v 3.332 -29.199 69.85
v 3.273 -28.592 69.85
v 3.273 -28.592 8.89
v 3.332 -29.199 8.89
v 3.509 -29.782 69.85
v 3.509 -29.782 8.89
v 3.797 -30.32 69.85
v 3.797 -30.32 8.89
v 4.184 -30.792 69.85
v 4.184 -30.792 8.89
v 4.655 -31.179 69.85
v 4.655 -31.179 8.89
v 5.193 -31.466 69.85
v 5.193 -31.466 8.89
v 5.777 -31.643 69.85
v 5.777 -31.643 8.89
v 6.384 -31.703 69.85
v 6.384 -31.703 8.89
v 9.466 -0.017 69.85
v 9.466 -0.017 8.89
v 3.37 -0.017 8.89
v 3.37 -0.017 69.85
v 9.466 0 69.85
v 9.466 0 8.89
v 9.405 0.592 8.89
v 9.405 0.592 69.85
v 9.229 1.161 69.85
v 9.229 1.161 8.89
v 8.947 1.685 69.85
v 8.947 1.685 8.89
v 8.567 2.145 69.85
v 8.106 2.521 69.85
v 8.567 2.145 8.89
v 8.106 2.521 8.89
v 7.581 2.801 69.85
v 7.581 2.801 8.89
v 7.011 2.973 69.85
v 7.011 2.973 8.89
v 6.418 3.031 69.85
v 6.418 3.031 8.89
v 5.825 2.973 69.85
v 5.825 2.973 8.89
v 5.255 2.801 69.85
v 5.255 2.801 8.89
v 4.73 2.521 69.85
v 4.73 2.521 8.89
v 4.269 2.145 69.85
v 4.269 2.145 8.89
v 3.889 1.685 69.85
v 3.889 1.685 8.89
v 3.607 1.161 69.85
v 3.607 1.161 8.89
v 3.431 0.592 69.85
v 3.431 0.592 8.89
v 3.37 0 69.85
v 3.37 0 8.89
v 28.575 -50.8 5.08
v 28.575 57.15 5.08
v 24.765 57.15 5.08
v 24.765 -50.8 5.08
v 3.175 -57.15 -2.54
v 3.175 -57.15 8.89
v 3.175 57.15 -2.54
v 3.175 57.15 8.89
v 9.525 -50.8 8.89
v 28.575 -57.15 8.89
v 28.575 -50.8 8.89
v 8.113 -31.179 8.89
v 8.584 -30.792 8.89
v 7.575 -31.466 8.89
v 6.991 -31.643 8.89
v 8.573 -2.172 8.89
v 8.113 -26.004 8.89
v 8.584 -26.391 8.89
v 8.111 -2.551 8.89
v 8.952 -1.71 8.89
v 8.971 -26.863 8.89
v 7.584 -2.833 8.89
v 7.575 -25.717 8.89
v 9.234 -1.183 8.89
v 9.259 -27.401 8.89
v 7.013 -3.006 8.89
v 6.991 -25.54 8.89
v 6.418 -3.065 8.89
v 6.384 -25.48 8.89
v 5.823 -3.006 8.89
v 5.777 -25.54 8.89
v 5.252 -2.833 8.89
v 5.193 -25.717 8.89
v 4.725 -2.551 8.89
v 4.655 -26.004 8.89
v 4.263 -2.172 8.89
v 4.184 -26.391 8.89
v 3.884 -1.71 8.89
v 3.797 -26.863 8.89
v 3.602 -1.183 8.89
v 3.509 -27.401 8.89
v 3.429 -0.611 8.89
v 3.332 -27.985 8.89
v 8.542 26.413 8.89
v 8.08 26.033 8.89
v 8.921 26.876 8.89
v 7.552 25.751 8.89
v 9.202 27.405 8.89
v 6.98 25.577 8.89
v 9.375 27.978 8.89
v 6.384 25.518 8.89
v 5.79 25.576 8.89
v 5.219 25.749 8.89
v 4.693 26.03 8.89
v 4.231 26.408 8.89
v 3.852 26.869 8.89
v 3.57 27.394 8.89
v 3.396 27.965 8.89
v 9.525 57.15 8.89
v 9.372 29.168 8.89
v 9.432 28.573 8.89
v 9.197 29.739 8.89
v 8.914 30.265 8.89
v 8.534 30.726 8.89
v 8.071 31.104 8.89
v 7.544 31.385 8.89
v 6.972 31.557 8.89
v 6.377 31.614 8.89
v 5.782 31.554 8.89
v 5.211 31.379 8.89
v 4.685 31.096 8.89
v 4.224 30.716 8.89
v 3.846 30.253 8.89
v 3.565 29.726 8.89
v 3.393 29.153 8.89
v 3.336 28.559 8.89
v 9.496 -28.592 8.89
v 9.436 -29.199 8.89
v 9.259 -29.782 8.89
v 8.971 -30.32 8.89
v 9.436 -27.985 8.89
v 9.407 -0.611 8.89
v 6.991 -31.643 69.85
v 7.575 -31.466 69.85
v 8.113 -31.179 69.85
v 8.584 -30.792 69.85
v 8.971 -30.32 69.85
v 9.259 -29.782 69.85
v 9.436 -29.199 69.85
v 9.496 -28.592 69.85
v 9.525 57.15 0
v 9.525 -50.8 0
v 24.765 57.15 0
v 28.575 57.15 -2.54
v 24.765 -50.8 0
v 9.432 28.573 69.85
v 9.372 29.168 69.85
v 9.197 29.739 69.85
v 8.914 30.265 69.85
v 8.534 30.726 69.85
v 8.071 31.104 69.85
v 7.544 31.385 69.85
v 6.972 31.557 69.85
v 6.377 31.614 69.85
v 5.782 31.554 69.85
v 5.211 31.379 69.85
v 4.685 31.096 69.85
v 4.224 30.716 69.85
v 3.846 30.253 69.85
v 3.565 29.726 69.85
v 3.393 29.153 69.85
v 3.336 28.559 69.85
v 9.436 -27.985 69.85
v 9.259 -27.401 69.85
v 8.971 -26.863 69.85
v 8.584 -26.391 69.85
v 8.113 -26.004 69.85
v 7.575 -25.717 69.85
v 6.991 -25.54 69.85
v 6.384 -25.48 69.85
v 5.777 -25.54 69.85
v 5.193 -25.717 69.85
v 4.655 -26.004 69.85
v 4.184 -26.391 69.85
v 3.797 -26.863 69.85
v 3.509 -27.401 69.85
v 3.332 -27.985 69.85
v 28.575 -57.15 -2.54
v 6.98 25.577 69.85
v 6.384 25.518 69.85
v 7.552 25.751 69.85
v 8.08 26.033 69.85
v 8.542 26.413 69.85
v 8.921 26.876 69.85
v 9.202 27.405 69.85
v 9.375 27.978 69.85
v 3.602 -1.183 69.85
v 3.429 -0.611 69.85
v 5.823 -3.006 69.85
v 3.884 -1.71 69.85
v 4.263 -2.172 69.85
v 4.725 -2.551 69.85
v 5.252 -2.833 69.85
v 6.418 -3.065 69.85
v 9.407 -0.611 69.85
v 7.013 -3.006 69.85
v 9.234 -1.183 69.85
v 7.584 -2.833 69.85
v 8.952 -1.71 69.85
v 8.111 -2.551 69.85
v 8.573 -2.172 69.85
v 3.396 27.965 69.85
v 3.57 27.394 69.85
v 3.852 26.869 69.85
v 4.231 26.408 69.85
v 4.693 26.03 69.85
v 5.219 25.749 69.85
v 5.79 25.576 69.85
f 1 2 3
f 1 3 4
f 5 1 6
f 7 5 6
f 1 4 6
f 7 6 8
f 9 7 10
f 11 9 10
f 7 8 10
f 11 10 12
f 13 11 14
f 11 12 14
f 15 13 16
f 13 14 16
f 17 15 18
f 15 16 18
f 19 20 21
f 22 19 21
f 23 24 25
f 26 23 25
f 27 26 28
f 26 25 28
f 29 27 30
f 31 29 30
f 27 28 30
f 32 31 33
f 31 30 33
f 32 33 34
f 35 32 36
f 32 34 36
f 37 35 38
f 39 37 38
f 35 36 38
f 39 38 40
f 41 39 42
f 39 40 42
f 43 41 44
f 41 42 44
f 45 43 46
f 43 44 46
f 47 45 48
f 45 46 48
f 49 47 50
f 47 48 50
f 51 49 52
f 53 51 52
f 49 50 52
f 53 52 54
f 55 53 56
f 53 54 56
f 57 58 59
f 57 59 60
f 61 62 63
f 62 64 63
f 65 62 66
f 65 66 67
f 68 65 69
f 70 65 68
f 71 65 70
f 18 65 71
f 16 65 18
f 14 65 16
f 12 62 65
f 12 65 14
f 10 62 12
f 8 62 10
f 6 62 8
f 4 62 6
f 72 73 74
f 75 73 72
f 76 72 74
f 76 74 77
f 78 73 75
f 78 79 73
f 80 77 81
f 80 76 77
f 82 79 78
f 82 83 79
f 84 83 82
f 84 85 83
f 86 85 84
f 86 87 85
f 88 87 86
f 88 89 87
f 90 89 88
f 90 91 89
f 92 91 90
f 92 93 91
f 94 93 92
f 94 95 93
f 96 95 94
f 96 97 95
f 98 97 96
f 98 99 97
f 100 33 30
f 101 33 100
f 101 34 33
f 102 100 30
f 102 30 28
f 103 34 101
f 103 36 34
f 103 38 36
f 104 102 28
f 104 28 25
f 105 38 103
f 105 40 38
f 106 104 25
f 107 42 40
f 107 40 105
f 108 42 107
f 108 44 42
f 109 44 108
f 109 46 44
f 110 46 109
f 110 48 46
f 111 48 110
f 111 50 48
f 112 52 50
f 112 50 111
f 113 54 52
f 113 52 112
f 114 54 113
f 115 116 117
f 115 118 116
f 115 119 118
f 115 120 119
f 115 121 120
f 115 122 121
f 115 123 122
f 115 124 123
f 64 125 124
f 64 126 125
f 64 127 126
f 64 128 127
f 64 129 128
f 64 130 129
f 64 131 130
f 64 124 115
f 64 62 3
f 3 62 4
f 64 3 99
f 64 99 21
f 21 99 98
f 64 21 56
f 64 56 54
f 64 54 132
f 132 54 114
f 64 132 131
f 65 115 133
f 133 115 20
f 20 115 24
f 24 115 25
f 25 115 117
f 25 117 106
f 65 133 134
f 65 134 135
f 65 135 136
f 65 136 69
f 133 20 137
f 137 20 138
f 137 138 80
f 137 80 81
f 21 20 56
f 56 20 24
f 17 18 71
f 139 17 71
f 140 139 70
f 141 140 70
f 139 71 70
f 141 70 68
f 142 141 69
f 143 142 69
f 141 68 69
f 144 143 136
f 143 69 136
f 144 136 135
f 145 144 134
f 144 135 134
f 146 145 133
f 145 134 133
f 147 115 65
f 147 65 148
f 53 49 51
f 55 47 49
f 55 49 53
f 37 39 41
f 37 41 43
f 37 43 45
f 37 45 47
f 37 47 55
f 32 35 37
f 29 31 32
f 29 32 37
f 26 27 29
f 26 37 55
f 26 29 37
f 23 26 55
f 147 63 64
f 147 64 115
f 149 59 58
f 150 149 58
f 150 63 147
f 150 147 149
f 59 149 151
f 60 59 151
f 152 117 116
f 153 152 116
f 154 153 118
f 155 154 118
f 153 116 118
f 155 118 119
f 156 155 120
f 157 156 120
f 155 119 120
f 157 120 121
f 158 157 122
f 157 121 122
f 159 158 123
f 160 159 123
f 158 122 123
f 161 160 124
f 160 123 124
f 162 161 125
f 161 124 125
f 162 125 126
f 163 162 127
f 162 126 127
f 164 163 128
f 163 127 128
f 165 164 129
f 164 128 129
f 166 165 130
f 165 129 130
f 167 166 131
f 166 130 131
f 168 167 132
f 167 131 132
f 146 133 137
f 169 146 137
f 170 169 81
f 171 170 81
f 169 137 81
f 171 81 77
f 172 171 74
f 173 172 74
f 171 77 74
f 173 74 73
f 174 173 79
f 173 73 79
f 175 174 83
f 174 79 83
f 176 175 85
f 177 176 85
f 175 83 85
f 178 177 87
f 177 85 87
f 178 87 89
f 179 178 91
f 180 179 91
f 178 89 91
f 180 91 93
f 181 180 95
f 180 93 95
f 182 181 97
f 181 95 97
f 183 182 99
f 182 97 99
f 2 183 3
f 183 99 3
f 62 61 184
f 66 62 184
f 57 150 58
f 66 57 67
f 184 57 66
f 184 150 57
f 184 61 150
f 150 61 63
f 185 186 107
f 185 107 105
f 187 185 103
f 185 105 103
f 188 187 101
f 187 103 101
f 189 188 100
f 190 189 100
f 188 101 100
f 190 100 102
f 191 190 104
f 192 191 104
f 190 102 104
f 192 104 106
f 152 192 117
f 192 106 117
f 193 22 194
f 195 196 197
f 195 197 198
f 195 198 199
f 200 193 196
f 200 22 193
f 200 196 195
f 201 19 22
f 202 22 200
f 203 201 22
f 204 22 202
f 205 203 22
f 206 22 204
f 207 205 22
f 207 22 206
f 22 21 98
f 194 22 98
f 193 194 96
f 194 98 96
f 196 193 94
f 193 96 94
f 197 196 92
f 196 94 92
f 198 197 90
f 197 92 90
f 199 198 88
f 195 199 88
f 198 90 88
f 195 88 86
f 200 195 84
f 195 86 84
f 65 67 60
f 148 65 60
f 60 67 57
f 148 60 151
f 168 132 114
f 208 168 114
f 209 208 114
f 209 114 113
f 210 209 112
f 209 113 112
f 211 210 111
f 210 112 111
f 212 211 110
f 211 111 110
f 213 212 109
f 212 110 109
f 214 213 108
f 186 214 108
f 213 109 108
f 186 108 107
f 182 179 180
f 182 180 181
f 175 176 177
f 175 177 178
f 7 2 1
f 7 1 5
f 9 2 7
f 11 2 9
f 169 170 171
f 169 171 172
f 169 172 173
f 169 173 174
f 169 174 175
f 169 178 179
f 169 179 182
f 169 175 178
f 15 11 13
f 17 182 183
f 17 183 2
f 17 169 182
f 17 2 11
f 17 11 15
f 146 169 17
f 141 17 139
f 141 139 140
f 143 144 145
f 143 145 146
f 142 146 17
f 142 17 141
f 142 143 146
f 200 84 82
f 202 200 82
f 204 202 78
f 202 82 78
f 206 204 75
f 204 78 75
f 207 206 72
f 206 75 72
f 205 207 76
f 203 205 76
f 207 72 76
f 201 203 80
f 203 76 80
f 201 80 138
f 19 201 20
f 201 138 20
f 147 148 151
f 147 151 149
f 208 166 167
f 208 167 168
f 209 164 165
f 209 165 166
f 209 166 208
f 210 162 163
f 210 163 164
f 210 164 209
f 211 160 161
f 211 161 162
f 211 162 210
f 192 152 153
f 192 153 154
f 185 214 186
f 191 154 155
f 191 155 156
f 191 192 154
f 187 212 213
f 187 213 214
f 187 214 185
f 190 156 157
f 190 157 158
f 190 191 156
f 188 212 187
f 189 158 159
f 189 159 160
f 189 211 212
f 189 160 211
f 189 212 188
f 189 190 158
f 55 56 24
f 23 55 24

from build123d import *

# Parameters (mm, degrees)
F0_W     = 8.89
F0_H     = 114.3
F1_DEPTH = 6.35
F0_W_2   = 2.54
F2_DEPTH = 25.4
F3_W     = 114.3
F3_H     = 3.81
F4_DEPTH = 5.08
F6_DEPTH = 60.96
F7_W     = 11.43
F7_H     = 25.4
F8_DEPTH = 6.35
F9_ANGLE = 270


with BuildPart() as f1:
    # F0 (on Top) → F1 (new body)
    with BuildSketch(Plane.XY):
        with Locations((-1.27, 0)):
            Rectangle(F0_W, F0_H)
    extrude(amount=F1_DEPTH)

    # F0 (on Top) → F2 (join)
    with BuildSketch(Plane.XY):
        with Locations((4.445, 0)):
            Rectangle(F0_W_2, F0_H)
    extrude(amount=F2_DEPTH)

    # F3 (on face) → F4 (join)
    with BuildSketch(Plane(origin=(3.175, 0, 0), x_dir=(0, -1, 0), z_dir=(-1, 0, 0))):
        with Locations((0, 23.495)):
            Rectangle(F3_W, F3_H)
    extrude(amount=F4_DEPTH)

    # F5 (on face) → F6 (join)
    with BuildSketch(Plane(origin=(-5.715, 0, 0), x_dir=(0, -1, 0), z_dir=(-1, 0, 0))):
        with BuildLine():
            ThreePointArc((-28.5731967743, 6.2570092164), (-31.6139310129, 3.2017607338), (-28.5586825303, 0.1610264952))
            Line((-28.5586825303, 0.1610264952), (-28.5731967743, 6.2570092164))
        make_face()
        with BuildLine():
            Line((-28.5731967743, 6.2570092164), (-28.5586825303, 0.1610264952))
            ThreePointArc((-28.5586825303, 0.1610264952), (-26.4081139286, 1.0563236959), (-25.5179396523, 3.2090178558))
            ThreePointArc((-25.5179396523, 3.2090178558), (-26.4132454924, 5.3668435795), (-28.5731967743, 6.2570092164))
        make_face()
        with BuildLine():
            ThreePointArc((28.5915388763, 6.3205178558), (25.4800388763, 3.2090178558), (28.5915388763, 0.0975178558))
            Line((28.5915388763, 0.0975178558), (28.5915388763, 6.3205178558))
        make_face()
        with BuildLine():
            Line((28.5915388763, 6.3205178558), (28.5915388763, 0.0975178558))
            ThreePointArc((28.5915388763, 0.0975178558), (30.791701626, 1.0088551061), (31.7030388763, 3.2090178558))
            ThreePointArc((31.7030388763, 3.2090178558), (30.791701626, 5.4091806055), (28.5915388763, 6.3205178558))
        make_face()
        with BuildLine():
            ThreePointArc((0, 6.2909908401), (-3.0314611237, 3.2430357116), (0, 0.1950805831))
            Line((0, 0.1950805831), (0, 6.2909908401))
        make_face()
        with BuildLine():
            Line((0.0165388763, 6.2910357116), (0.0165388763, 0.1950357116))
            ThreePointArc((0.0165388763, 0.1950357116), (2.1718003454, 1.0877742425), (3.0645388763, 3.2430357116))
            ThreePointArc((3.0645388763, 3.2430357116), (2.1718003454, 5.3982971806), (0.0165388763, 6.2910357116))
        make_face()
    extrude(amount=F6_DEPTH)

    # F7 (on face) → F8 (join)
    with BuildSketch(Plane.XZ.offset(57.15)):
        with Locations((0, 12.7)):
            Rectangle(F7_W, F7_H)
    extrude(amount=-F8_DEPTH)


with BuildPart() as f1_1:
    # F9: moved
    add(f1.part.rotate(Axis((3.175, 0, 0), (0, -1, 0)), F9_ANGLE))


solid = f1_1.part
